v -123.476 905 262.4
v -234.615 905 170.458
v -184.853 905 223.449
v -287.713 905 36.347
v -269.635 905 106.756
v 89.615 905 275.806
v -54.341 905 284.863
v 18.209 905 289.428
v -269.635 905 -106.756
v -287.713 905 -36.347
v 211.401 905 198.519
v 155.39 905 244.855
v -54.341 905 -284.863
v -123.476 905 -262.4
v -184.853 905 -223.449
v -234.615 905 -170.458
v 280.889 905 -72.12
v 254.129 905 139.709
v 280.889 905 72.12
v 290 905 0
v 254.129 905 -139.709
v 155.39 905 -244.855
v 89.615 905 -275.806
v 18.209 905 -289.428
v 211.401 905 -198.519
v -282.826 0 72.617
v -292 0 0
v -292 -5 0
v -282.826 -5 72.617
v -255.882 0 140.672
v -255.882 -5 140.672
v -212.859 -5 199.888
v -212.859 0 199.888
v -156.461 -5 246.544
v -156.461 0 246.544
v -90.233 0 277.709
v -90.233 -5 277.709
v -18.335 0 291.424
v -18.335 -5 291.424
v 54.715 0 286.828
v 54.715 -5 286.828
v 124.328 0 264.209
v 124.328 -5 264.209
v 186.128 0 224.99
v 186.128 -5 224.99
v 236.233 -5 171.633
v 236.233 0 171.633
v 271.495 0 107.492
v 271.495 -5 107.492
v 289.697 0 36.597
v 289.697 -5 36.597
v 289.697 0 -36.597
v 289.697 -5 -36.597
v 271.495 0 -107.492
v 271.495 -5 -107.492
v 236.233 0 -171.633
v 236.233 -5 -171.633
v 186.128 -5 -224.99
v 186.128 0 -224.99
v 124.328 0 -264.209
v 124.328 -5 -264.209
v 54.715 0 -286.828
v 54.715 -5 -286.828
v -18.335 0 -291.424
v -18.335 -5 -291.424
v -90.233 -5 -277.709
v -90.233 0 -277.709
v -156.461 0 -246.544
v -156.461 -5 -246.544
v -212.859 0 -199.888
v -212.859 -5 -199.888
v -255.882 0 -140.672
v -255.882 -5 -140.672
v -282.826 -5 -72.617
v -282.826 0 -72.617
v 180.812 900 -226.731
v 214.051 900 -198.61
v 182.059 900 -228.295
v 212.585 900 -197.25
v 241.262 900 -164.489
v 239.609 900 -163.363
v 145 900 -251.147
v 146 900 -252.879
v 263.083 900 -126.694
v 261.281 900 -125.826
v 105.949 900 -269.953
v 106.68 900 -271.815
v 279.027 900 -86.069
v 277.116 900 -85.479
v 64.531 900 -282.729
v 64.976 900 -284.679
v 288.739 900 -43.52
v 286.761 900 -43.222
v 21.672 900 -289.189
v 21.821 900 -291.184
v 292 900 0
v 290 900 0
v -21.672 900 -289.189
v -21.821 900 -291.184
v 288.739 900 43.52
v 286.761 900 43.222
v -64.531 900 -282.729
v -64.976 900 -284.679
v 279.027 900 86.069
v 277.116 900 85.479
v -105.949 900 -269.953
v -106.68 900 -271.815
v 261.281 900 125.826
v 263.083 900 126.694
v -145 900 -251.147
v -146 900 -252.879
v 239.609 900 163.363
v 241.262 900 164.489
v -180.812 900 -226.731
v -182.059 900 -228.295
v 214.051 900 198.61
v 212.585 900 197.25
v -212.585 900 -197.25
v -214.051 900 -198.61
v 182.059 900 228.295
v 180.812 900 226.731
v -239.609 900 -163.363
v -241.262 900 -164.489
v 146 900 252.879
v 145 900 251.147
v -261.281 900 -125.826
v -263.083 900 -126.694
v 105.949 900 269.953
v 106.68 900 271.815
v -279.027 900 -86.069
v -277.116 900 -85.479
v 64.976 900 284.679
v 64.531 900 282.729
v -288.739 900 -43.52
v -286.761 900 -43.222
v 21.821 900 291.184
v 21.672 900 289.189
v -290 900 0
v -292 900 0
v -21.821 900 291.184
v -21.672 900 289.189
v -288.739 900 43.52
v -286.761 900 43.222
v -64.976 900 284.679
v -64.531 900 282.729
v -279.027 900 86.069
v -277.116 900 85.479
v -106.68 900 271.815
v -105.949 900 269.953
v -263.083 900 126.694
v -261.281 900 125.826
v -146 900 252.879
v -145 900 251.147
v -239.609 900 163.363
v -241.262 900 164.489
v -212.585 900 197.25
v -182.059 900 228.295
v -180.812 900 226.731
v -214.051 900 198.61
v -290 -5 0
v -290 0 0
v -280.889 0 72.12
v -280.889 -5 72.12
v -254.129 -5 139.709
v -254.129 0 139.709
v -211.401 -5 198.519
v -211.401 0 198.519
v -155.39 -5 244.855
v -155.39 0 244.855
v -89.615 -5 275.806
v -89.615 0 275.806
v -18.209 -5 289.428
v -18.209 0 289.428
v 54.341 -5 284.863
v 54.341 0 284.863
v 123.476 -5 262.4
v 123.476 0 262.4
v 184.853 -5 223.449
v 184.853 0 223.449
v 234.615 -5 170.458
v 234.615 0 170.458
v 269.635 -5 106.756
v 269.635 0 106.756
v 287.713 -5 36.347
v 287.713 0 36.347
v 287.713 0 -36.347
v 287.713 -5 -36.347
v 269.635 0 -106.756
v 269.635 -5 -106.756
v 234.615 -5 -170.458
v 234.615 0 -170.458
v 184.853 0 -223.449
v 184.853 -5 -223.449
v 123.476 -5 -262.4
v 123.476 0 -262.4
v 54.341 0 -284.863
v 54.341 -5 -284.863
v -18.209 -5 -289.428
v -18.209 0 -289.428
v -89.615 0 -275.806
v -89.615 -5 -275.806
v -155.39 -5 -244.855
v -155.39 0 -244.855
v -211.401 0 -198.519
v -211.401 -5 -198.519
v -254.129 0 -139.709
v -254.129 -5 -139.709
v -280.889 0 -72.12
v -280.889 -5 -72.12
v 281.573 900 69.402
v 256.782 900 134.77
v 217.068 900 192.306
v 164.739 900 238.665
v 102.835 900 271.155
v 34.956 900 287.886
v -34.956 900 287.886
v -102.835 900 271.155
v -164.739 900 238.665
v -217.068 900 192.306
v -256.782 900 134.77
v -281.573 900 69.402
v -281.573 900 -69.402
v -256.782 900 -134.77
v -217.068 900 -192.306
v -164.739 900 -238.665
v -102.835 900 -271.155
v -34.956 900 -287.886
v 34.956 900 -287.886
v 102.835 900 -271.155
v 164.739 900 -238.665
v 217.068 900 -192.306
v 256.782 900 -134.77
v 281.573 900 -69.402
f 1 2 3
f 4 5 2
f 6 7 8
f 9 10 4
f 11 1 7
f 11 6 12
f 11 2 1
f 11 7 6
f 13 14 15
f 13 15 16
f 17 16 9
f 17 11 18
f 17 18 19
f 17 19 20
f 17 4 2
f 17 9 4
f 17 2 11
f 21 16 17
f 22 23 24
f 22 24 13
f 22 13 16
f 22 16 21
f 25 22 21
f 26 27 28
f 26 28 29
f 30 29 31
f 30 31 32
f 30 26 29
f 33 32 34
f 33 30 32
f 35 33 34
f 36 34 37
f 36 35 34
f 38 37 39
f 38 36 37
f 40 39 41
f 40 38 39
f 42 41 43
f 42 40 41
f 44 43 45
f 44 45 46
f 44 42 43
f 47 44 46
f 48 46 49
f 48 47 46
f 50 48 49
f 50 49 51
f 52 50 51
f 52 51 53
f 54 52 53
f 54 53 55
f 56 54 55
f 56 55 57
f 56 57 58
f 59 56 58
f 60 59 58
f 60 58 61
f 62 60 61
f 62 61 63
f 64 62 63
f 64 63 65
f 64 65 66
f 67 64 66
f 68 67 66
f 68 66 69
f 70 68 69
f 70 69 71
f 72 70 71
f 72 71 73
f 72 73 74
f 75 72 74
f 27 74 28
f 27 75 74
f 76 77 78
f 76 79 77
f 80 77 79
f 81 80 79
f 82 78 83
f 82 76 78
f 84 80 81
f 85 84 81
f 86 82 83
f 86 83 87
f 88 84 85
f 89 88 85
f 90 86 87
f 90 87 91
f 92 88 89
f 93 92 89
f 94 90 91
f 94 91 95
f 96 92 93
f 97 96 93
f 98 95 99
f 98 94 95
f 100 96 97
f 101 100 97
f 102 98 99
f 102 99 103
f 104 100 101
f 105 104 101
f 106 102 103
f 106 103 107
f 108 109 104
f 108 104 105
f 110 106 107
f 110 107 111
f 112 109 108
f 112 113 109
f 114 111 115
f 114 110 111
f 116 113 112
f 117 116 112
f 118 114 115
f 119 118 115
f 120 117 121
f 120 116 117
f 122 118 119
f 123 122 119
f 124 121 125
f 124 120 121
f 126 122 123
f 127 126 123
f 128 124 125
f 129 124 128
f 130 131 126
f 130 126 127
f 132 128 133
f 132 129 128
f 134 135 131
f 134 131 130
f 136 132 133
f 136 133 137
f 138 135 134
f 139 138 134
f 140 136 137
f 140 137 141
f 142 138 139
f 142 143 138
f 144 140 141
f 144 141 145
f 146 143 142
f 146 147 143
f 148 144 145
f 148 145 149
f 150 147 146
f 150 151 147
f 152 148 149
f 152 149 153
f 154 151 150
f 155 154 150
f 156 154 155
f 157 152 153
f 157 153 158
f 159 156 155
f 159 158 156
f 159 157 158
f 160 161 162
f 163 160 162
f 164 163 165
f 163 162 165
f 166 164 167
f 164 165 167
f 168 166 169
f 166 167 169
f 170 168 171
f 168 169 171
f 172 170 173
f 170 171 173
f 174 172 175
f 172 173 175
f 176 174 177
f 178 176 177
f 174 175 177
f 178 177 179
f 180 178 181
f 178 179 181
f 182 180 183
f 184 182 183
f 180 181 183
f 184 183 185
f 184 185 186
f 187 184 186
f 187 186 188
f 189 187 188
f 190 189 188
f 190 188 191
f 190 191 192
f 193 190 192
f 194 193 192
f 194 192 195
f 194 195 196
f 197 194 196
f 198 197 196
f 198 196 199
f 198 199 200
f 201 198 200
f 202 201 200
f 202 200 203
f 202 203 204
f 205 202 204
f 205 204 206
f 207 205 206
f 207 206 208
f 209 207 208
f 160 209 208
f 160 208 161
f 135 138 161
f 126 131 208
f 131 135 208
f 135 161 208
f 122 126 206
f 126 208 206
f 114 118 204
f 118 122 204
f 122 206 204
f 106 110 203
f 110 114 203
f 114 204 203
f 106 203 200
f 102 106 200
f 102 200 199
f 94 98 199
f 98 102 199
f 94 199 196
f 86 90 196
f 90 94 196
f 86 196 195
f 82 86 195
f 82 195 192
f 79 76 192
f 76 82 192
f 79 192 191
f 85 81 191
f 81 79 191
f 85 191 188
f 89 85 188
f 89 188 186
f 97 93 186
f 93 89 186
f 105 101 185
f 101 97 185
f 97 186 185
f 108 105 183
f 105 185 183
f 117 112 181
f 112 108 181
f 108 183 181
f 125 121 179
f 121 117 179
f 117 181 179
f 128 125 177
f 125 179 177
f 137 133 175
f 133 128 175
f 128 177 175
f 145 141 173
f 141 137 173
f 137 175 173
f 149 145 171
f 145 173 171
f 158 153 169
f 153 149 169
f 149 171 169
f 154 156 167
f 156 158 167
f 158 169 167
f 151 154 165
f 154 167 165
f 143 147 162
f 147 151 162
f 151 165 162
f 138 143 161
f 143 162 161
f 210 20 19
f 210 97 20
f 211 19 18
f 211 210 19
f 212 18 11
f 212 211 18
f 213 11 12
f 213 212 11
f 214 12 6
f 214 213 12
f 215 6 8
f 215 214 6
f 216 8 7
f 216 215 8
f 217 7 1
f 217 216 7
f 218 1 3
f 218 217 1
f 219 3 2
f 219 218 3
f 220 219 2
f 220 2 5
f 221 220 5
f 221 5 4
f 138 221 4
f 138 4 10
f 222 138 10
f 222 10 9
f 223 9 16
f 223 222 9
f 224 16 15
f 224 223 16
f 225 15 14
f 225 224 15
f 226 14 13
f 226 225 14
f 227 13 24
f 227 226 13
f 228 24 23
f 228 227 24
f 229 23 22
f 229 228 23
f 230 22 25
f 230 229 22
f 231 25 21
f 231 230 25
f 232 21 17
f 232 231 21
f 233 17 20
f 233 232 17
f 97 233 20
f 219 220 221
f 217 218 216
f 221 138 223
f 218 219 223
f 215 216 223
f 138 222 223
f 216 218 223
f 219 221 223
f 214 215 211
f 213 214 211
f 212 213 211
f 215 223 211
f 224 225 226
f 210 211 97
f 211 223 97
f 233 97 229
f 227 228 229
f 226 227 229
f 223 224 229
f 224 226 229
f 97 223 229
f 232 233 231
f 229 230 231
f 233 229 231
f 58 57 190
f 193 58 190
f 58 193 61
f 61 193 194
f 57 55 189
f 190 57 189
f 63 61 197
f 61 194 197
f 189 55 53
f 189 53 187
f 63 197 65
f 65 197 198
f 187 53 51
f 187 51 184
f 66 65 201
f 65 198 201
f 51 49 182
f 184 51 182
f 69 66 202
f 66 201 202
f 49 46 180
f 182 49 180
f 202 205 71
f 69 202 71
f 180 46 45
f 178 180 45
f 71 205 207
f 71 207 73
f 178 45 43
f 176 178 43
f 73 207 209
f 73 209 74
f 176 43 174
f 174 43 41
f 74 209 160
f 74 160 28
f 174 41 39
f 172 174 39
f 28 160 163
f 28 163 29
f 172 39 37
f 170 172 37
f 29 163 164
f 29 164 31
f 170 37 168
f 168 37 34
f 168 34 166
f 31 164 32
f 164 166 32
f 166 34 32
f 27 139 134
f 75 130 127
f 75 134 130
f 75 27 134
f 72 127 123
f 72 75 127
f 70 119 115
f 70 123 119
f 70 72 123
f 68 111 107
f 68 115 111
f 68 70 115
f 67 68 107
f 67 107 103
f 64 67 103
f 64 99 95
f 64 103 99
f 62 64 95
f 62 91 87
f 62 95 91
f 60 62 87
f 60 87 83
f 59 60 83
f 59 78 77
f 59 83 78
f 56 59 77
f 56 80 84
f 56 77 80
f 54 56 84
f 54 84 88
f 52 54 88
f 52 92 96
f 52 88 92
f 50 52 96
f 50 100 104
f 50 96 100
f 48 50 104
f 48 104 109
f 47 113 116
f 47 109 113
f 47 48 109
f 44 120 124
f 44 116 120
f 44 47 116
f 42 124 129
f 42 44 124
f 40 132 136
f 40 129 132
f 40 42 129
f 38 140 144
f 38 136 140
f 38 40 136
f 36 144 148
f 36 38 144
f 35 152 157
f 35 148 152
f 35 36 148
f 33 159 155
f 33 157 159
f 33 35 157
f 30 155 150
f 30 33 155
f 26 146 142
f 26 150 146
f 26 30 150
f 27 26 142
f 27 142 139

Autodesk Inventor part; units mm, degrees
ref_plane "YZ Plane" through (0, 0, 0) normal (1, 0, 0) x (0, 1, 0)
ref_plane "XZ Plane" through (0, 0, 0) normal (0, 1, 0) x (-1, 0, 0)
ref_plane "XY Plane" through (0, 0, 0) normal (0, 0, 1) x (1, 0, 0)
sketch "Sketch1" plane through (0, 0, 0) normal (0, 1, 0) x (-1, 0, 0)
  circle A0 centre (0, 0) radius 290
  circle A1 centre (0, 0) radius 292
  dimension "d0" = 580
  dimension "d1" = 584
extrude "Extrusion1" add sketch "Sketch1" along normal blind 900 and the other way blind 5
sketch "Sketch2" plane through (0, 900, 0) normal (0, 1, 0) x (1, 0, 0)
  circle A0 centre (0, 0) radius 290
  dimension "d6" = 580
extrude "Extrusion2" add sketch "Sketch2" along normal blind 5
properties part number "tank" material "Stainless Steel"
